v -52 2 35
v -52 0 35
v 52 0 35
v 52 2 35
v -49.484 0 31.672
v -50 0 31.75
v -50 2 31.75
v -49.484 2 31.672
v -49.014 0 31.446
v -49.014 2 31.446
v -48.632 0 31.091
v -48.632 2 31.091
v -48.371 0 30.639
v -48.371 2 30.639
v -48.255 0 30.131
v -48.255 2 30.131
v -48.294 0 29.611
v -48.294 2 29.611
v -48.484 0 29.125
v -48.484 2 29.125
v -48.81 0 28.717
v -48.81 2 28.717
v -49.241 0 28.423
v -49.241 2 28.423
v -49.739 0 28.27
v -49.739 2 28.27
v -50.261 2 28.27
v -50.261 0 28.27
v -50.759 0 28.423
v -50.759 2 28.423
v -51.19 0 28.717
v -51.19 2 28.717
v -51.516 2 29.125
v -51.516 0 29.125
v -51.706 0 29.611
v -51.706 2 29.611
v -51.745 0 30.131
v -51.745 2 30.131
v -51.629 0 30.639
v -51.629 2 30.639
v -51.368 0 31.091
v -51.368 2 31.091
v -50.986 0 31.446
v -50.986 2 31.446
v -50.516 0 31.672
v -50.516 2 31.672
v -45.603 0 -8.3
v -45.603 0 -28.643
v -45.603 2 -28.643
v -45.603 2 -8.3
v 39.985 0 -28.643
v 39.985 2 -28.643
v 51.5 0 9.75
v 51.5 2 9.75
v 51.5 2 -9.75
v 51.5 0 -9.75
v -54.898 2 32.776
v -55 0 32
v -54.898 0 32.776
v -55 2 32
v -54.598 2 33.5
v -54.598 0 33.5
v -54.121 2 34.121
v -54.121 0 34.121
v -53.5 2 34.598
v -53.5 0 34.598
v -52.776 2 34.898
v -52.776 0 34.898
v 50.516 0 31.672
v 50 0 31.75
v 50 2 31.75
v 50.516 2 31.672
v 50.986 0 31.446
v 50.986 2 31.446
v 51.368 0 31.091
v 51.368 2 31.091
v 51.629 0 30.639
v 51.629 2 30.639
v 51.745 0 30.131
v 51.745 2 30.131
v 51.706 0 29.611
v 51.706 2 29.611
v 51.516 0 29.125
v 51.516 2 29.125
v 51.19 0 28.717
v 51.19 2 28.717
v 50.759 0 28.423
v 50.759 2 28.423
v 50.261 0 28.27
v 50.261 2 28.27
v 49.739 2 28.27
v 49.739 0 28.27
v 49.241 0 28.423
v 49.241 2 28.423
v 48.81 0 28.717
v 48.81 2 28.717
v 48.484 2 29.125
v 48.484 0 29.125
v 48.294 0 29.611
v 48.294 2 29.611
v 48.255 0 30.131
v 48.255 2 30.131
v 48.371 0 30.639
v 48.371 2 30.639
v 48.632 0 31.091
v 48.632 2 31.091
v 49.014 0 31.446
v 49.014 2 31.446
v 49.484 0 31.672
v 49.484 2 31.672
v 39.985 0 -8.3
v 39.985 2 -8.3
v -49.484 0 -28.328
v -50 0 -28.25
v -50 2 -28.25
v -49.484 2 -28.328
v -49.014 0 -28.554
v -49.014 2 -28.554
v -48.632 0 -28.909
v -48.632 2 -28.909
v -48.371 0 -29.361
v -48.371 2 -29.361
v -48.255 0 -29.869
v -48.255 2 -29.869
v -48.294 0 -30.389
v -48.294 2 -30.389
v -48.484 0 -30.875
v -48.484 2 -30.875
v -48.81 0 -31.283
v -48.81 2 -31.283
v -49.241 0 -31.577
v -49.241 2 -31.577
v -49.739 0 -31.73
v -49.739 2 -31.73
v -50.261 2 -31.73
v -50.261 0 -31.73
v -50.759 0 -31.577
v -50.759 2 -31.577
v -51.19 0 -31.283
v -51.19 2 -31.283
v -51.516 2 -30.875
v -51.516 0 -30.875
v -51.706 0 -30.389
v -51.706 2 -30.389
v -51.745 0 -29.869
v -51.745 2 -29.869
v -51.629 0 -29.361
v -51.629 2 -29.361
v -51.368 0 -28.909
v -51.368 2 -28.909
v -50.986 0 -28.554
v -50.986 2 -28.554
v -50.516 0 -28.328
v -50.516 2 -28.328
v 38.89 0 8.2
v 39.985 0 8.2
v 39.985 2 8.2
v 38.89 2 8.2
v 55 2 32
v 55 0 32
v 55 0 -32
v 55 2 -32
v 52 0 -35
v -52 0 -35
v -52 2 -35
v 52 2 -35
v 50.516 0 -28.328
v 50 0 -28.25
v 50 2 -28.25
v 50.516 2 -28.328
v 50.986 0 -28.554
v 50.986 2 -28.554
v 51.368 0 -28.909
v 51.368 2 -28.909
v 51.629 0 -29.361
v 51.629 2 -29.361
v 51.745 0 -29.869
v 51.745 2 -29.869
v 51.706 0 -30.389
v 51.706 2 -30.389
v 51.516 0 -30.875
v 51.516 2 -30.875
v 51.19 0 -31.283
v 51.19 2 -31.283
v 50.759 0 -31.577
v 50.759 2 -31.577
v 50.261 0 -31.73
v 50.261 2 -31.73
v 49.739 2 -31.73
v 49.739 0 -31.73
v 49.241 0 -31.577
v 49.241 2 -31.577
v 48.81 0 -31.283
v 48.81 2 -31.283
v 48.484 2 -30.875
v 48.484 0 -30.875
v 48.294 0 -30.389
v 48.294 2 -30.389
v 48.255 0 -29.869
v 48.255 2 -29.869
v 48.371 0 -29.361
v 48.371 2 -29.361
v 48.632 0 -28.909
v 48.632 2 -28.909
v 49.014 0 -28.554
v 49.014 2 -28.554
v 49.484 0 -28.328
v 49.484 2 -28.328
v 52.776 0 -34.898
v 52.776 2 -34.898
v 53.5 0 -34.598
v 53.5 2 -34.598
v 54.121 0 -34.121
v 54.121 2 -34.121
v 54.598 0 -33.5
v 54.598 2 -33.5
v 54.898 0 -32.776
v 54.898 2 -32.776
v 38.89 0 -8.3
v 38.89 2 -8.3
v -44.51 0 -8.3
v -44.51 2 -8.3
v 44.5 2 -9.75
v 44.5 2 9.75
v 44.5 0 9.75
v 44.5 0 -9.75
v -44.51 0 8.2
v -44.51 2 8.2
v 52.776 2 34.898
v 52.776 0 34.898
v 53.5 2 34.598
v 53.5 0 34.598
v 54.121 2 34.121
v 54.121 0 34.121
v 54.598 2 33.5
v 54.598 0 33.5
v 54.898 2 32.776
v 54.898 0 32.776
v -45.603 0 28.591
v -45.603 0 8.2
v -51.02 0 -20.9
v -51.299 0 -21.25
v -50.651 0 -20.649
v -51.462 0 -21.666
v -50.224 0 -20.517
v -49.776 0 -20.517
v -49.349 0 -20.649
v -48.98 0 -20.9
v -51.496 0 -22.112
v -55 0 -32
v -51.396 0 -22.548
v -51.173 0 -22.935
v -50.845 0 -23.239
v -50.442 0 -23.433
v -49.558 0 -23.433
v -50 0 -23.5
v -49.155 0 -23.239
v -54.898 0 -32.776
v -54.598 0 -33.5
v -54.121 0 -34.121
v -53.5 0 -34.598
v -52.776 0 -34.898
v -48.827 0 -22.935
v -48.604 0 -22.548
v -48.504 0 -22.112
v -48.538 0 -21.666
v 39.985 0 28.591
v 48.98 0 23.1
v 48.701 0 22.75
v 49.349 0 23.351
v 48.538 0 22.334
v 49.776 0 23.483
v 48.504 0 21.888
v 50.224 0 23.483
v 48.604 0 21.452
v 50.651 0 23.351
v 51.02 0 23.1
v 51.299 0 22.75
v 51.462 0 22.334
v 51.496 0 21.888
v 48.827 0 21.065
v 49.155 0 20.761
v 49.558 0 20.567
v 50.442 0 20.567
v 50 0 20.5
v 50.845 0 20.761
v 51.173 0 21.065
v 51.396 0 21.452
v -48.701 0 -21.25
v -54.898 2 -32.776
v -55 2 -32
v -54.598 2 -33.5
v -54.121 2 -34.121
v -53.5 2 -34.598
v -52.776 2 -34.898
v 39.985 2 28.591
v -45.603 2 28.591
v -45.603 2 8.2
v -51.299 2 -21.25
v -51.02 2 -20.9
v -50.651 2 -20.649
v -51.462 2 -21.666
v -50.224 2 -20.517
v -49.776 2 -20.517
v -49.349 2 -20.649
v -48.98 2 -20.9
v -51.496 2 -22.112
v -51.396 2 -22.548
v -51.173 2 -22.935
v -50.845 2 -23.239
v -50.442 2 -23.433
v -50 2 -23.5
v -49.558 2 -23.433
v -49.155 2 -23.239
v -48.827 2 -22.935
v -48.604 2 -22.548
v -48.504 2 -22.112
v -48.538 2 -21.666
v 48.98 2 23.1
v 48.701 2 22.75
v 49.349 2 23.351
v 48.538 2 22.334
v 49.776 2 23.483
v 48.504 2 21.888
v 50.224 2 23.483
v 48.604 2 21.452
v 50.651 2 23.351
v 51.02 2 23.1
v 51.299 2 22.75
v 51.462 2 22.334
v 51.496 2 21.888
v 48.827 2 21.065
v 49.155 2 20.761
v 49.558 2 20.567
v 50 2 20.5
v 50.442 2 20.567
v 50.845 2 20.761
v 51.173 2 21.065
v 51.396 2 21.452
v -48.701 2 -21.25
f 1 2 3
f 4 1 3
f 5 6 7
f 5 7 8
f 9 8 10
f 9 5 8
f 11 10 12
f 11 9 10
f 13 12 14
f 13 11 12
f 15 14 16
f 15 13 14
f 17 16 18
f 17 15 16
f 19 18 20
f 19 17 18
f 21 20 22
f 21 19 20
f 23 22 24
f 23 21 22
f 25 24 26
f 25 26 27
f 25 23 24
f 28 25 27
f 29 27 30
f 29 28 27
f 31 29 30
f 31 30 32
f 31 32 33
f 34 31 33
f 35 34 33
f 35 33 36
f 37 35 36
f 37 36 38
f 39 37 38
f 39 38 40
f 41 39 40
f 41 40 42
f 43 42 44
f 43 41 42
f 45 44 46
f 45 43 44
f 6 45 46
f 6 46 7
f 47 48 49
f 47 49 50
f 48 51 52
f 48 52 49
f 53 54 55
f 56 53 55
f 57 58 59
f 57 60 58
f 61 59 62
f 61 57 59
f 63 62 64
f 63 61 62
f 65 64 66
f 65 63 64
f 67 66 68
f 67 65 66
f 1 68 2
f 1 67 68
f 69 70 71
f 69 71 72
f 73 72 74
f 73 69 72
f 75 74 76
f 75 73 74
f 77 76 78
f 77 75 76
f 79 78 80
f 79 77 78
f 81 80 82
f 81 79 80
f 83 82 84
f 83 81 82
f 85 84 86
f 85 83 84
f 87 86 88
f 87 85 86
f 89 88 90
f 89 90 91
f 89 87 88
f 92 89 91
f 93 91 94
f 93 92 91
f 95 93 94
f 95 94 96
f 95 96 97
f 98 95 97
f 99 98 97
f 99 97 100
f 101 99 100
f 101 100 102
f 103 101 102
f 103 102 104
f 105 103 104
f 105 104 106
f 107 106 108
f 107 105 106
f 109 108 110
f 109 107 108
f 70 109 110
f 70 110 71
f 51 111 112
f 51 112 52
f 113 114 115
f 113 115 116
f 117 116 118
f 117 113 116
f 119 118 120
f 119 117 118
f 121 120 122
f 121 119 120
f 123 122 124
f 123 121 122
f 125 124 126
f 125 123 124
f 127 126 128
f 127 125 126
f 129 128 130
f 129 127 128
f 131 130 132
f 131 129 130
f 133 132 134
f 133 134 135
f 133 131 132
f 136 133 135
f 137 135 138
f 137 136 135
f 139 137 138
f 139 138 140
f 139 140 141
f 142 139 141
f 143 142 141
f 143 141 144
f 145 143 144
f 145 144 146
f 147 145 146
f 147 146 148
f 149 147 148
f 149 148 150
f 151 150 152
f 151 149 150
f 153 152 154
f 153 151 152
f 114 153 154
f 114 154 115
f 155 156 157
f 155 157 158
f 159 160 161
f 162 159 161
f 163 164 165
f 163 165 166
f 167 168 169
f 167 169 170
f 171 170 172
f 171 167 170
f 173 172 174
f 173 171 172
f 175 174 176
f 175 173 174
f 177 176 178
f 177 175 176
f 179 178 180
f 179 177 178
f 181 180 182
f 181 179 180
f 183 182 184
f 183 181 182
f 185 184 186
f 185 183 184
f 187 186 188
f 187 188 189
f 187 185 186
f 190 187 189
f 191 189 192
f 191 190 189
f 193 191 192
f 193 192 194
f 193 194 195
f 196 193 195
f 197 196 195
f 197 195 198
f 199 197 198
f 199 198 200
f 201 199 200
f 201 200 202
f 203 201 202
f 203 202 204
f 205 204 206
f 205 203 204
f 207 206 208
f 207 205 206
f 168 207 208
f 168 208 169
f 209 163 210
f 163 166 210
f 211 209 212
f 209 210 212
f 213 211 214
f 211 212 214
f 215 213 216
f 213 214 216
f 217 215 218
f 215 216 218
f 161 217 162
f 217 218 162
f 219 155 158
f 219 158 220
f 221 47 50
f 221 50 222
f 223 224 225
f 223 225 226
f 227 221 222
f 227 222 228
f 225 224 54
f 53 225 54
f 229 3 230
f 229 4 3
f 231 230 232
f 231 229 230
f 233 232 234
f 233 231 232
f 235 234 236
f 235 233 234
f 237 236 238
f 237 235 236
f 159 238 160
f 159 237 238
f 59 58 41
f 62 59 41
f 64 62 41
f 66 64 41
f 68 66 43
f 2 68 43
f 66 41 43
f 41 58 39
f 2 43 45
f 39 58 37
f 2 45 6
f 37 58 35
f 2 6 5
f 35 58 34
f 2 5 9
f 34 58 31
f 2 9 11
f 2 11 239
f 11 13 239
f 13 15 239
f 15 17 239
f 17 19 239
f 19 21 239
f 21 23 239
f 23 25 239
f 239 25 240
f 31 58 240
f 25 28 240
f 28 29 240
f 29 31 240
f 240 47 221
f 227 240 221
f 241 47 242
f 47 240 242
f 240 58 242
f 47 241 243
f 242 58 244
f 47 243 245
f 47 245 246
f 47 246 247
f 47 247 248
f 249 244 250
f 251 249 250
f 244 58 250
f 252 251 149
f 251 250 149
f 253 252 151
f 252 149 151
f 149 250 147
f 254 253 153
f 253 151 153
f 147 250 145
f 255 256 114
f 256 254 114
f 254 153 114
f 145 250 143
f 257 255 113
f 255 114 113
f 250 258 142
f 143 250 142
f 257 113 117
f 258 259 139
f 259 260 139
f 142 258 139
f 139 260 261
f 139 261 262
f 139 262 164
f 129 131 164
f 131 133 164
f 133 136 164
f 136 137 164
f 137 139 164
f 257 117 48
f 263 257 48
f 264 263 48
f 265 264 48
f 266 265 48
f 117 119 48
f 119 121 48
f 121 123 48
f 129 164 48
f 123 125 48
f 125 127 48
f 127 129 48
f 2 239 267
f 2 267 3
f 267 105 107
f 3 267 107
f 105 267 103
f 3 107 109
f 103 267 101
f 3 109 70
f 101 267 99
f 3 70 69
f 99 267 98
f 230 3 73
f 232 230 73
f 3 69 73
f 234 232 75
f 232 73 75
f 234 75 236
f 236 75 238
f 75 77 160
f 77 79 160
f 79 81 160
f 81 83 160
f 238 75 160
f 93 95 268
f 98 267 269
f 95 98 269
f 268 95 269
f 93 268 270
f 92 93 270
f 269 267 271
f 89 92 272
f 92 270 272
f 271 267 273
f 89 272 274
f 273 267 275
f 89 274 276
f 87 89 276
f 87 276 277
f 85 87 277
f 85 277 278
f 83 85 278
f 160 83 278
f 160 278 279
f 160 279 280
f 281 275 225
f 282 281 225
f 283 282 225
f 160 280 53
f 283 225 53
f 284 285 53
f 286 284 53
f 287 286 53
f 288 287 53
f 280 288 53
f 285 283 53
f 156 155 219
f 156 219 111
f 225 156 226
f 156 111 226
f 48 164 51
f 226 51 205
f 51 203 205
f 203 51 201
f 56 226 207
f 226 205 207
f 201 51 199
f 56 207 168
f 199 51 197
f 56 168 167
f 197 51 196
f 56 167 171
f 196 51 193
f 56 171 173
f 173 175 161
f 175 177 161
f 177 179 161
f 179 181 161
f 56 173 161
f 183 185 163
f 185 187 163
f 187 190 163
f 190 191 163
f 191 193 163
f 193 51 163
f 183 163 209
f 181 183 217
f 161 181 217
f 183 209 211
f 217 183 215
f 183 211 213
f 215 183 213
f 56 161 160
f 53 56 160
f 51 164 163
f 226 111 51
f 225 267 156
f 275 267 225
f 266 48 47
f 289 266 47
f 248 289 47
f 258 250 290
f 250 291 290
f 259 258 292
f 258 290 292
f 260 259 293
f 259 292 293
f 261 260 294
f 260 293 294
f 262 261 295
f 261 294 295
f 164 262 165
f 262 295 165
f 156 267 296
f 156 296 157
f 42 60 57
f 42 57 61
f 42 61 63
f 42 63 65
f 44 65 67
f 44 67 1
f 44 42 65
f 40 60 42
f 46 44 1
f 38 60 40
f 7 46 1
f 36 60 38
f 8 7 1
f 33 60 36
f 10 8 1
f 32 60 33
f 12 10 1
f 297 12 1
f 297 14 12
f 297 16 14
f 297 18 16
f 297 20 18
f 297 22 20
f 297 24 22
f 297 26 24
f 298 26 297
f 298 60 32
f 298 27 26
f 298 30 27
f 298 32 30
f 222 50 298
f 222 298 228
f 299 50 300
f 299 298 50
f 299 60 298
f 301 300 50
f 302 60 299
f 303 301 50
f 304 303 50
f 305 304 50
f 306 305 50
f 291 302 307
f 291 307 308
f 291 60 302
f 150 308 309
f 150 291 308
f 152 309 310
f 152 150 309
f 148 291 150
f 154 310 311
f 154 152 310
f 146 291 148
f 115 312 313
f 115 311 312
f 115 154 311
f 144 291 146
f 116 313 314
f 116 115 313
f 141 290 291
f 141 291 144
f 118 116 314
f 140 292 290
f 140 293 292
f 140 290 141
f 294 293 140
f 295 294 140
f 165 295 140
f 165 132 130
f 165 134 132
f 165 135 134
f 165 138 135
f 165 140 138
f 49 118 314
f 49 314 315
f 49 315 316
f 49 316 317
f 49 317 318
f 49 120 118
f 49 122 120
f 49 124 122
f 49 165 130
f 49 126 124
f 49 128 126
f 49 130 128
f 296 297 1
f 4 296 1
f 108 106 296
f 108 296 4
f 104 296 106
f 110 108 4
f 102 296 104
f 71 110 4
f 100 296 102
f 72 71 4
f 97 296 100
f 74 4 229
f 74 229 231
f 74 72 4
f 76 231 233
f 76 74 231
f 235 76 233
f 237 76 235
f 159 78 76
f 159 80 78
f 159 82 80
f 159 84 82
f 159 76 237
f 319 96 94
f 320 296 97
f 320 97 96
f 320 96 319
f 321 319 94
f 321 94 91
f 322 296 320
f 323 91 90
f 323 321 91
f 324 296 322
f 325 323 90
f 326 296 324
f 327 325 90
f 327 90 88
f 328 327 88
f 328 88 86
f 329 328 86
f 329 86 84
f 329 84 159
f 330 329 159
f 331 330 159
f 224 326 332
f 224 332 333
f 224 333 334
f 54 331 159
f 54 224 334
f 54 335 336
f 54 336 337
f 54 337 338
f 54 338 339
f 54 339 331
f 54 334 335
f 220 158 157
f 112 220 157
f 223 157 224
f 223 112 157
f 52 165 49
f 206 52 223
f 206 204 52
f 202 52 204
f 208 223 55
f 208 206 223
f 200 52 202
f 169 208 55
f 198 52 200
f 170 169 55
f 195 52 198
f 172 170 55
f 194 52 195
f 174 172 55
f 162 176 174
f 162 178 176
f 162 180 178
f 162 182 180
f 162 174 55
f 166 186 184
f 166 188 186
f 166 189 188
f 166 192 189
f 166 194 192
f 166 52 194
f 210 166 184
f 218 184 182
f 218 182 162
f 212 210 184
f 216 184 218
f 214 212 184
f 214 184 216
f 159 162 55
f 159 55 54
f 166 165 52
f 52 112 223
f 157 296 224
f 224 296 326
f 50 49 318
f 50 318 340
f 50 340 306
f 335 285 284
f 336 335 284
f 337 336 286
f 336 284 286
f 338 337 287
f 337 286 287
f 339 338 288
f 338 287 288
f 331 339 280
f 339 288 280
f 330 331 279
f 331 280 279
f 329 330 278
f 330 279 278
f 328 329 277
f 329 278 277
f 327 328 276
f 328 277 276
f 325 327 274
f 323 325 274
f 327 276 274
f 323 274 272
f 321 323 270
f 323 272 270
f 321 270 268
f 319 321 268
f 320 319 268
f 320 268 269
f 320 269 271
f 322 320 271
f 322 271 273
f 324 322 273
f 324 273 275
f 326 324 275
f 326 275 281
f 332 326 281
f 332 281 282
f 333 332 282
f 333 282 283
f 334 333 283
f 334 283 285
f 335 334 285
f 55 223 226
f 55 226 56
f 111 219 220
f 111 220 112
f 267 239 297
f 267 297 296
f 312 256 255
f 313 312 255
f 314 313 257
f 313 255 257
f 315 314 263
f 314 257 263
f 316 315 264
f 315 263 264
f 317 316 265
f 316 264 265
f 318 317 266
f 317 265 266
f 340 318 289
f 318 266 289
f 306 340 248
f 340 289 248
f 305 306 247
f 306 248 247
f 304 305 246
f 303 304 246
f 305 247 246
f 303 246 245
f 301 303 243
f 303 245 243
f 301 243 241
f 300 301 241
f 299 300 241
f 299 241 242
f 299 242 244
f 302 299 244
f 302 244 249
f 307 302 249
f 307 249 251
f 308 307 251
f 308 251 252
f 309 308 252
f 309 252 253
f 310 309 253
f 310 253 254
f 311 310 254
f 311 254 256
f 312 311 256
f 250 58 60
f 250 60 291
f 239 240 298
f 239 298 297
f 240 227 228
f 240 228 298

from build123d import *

# Parameters (mm, degrees)
SKETCH1_W           = 110
SKETCH1_H           = 70
SKETCH1_R           = 1.75
BOSS_EXTRUDE1_DEPTH = 2
SKETCH2_W           = 7
SKETCH2_H           = 19.5
CUT_EXTRUDE1_DEPTH  = 66.222695436
FILLET1_R           = 3
SKETCH3_R           = 1.5
CUT_EXTRUDE2_DEPTH  = 66.222695436


with BuildPart() as part:
    # Sketch1 → Boss-Extrude1 (new body)
    with BuildSketch(Plane(origin=(0, 0, 0), x_dir=(1, 0, 0), z_dir=(0, 1, 0))):
        Rectangle(SKETCH1_W, SKETCH1_H)
        with Locations(Location((-50, 30, 0), (0, 0, 270))):
            Circle(SKETCH1_R, mode=Mode.SUBTRACT)
        with Locations(Location((-50, -30, 0), (0, 0, 270))):
            Circle(SKETCH1_R, mode=Mode.SUBTRACT)
        with Locations(Location((50, -30, 0), (0, 0, 270))):
            Circle(SKETCH1_R, mode=Mode.SUBTRACT)
        with Locations(Location((50, 30, 0), (0, 0, 270))):
            Circle(SKETCH1_R, mode=Mode.SUBTRACT)
        Polygon((39.984778377, 28.64285469), (-45.603033207, 28.64285469), (-45.603033207, 8.299784998), (-44.51, 8.299784998), (-44.51, -8.200215002), (-45.603033207, -8.200215002), (-45.603033207, -28.591287888), (39.984778377, -28.591287888), (39.984778377, -8.200215002), (38.89, -8.200215002), (38.89, 8.299784998), (39.984778377, 8.299784998), align=None, mode=Mode.SUBTRACT)
    extrude(amount=BOSS_EXTRUDE1_DEPTH)

    # Sketch2 → Cut-Extrude1 (cut, through all)
    with BuildSketch(Plane(origin=(0, 2, 0), x_dir=(1, 0, 0), z_dir=(0, 1, 0))):
        with Locations((48, 0)):
            Rectangle(SKETCH2_W, SKETCH2_H)
    extrude(amount=-CUT_EXTRUDE1_DEPTH, mode=Mode.SUBTRACT)

    # Fillet1
    fillet1_edges = [part.edges().sort_by_distance(p)[0] for p in [
        (-55, 1, -35),
        (55, 1, -35),
        (55, 1, 35),
        (-55, 1, 35),
    ]]
    fillet(fillet1_edges, radius=FILLET1_R)

    # Sketch3 → Cut-Extrude2 (cut, through all)
    with BuildSketch(Plane.XZ):
        with Locations(Location((50, 22, 0), (0, 0, 270))):
            Circle(SKETCH3_R)
        with Locations(Location((-50, -22, 0), (0, 0, 270))):
            Circle(SKETCH3_R)
    extrude(amount=-CUT_EXTRUDE2_DEPTH, mode=Mode.SUBTRACT)


solid = part.part
